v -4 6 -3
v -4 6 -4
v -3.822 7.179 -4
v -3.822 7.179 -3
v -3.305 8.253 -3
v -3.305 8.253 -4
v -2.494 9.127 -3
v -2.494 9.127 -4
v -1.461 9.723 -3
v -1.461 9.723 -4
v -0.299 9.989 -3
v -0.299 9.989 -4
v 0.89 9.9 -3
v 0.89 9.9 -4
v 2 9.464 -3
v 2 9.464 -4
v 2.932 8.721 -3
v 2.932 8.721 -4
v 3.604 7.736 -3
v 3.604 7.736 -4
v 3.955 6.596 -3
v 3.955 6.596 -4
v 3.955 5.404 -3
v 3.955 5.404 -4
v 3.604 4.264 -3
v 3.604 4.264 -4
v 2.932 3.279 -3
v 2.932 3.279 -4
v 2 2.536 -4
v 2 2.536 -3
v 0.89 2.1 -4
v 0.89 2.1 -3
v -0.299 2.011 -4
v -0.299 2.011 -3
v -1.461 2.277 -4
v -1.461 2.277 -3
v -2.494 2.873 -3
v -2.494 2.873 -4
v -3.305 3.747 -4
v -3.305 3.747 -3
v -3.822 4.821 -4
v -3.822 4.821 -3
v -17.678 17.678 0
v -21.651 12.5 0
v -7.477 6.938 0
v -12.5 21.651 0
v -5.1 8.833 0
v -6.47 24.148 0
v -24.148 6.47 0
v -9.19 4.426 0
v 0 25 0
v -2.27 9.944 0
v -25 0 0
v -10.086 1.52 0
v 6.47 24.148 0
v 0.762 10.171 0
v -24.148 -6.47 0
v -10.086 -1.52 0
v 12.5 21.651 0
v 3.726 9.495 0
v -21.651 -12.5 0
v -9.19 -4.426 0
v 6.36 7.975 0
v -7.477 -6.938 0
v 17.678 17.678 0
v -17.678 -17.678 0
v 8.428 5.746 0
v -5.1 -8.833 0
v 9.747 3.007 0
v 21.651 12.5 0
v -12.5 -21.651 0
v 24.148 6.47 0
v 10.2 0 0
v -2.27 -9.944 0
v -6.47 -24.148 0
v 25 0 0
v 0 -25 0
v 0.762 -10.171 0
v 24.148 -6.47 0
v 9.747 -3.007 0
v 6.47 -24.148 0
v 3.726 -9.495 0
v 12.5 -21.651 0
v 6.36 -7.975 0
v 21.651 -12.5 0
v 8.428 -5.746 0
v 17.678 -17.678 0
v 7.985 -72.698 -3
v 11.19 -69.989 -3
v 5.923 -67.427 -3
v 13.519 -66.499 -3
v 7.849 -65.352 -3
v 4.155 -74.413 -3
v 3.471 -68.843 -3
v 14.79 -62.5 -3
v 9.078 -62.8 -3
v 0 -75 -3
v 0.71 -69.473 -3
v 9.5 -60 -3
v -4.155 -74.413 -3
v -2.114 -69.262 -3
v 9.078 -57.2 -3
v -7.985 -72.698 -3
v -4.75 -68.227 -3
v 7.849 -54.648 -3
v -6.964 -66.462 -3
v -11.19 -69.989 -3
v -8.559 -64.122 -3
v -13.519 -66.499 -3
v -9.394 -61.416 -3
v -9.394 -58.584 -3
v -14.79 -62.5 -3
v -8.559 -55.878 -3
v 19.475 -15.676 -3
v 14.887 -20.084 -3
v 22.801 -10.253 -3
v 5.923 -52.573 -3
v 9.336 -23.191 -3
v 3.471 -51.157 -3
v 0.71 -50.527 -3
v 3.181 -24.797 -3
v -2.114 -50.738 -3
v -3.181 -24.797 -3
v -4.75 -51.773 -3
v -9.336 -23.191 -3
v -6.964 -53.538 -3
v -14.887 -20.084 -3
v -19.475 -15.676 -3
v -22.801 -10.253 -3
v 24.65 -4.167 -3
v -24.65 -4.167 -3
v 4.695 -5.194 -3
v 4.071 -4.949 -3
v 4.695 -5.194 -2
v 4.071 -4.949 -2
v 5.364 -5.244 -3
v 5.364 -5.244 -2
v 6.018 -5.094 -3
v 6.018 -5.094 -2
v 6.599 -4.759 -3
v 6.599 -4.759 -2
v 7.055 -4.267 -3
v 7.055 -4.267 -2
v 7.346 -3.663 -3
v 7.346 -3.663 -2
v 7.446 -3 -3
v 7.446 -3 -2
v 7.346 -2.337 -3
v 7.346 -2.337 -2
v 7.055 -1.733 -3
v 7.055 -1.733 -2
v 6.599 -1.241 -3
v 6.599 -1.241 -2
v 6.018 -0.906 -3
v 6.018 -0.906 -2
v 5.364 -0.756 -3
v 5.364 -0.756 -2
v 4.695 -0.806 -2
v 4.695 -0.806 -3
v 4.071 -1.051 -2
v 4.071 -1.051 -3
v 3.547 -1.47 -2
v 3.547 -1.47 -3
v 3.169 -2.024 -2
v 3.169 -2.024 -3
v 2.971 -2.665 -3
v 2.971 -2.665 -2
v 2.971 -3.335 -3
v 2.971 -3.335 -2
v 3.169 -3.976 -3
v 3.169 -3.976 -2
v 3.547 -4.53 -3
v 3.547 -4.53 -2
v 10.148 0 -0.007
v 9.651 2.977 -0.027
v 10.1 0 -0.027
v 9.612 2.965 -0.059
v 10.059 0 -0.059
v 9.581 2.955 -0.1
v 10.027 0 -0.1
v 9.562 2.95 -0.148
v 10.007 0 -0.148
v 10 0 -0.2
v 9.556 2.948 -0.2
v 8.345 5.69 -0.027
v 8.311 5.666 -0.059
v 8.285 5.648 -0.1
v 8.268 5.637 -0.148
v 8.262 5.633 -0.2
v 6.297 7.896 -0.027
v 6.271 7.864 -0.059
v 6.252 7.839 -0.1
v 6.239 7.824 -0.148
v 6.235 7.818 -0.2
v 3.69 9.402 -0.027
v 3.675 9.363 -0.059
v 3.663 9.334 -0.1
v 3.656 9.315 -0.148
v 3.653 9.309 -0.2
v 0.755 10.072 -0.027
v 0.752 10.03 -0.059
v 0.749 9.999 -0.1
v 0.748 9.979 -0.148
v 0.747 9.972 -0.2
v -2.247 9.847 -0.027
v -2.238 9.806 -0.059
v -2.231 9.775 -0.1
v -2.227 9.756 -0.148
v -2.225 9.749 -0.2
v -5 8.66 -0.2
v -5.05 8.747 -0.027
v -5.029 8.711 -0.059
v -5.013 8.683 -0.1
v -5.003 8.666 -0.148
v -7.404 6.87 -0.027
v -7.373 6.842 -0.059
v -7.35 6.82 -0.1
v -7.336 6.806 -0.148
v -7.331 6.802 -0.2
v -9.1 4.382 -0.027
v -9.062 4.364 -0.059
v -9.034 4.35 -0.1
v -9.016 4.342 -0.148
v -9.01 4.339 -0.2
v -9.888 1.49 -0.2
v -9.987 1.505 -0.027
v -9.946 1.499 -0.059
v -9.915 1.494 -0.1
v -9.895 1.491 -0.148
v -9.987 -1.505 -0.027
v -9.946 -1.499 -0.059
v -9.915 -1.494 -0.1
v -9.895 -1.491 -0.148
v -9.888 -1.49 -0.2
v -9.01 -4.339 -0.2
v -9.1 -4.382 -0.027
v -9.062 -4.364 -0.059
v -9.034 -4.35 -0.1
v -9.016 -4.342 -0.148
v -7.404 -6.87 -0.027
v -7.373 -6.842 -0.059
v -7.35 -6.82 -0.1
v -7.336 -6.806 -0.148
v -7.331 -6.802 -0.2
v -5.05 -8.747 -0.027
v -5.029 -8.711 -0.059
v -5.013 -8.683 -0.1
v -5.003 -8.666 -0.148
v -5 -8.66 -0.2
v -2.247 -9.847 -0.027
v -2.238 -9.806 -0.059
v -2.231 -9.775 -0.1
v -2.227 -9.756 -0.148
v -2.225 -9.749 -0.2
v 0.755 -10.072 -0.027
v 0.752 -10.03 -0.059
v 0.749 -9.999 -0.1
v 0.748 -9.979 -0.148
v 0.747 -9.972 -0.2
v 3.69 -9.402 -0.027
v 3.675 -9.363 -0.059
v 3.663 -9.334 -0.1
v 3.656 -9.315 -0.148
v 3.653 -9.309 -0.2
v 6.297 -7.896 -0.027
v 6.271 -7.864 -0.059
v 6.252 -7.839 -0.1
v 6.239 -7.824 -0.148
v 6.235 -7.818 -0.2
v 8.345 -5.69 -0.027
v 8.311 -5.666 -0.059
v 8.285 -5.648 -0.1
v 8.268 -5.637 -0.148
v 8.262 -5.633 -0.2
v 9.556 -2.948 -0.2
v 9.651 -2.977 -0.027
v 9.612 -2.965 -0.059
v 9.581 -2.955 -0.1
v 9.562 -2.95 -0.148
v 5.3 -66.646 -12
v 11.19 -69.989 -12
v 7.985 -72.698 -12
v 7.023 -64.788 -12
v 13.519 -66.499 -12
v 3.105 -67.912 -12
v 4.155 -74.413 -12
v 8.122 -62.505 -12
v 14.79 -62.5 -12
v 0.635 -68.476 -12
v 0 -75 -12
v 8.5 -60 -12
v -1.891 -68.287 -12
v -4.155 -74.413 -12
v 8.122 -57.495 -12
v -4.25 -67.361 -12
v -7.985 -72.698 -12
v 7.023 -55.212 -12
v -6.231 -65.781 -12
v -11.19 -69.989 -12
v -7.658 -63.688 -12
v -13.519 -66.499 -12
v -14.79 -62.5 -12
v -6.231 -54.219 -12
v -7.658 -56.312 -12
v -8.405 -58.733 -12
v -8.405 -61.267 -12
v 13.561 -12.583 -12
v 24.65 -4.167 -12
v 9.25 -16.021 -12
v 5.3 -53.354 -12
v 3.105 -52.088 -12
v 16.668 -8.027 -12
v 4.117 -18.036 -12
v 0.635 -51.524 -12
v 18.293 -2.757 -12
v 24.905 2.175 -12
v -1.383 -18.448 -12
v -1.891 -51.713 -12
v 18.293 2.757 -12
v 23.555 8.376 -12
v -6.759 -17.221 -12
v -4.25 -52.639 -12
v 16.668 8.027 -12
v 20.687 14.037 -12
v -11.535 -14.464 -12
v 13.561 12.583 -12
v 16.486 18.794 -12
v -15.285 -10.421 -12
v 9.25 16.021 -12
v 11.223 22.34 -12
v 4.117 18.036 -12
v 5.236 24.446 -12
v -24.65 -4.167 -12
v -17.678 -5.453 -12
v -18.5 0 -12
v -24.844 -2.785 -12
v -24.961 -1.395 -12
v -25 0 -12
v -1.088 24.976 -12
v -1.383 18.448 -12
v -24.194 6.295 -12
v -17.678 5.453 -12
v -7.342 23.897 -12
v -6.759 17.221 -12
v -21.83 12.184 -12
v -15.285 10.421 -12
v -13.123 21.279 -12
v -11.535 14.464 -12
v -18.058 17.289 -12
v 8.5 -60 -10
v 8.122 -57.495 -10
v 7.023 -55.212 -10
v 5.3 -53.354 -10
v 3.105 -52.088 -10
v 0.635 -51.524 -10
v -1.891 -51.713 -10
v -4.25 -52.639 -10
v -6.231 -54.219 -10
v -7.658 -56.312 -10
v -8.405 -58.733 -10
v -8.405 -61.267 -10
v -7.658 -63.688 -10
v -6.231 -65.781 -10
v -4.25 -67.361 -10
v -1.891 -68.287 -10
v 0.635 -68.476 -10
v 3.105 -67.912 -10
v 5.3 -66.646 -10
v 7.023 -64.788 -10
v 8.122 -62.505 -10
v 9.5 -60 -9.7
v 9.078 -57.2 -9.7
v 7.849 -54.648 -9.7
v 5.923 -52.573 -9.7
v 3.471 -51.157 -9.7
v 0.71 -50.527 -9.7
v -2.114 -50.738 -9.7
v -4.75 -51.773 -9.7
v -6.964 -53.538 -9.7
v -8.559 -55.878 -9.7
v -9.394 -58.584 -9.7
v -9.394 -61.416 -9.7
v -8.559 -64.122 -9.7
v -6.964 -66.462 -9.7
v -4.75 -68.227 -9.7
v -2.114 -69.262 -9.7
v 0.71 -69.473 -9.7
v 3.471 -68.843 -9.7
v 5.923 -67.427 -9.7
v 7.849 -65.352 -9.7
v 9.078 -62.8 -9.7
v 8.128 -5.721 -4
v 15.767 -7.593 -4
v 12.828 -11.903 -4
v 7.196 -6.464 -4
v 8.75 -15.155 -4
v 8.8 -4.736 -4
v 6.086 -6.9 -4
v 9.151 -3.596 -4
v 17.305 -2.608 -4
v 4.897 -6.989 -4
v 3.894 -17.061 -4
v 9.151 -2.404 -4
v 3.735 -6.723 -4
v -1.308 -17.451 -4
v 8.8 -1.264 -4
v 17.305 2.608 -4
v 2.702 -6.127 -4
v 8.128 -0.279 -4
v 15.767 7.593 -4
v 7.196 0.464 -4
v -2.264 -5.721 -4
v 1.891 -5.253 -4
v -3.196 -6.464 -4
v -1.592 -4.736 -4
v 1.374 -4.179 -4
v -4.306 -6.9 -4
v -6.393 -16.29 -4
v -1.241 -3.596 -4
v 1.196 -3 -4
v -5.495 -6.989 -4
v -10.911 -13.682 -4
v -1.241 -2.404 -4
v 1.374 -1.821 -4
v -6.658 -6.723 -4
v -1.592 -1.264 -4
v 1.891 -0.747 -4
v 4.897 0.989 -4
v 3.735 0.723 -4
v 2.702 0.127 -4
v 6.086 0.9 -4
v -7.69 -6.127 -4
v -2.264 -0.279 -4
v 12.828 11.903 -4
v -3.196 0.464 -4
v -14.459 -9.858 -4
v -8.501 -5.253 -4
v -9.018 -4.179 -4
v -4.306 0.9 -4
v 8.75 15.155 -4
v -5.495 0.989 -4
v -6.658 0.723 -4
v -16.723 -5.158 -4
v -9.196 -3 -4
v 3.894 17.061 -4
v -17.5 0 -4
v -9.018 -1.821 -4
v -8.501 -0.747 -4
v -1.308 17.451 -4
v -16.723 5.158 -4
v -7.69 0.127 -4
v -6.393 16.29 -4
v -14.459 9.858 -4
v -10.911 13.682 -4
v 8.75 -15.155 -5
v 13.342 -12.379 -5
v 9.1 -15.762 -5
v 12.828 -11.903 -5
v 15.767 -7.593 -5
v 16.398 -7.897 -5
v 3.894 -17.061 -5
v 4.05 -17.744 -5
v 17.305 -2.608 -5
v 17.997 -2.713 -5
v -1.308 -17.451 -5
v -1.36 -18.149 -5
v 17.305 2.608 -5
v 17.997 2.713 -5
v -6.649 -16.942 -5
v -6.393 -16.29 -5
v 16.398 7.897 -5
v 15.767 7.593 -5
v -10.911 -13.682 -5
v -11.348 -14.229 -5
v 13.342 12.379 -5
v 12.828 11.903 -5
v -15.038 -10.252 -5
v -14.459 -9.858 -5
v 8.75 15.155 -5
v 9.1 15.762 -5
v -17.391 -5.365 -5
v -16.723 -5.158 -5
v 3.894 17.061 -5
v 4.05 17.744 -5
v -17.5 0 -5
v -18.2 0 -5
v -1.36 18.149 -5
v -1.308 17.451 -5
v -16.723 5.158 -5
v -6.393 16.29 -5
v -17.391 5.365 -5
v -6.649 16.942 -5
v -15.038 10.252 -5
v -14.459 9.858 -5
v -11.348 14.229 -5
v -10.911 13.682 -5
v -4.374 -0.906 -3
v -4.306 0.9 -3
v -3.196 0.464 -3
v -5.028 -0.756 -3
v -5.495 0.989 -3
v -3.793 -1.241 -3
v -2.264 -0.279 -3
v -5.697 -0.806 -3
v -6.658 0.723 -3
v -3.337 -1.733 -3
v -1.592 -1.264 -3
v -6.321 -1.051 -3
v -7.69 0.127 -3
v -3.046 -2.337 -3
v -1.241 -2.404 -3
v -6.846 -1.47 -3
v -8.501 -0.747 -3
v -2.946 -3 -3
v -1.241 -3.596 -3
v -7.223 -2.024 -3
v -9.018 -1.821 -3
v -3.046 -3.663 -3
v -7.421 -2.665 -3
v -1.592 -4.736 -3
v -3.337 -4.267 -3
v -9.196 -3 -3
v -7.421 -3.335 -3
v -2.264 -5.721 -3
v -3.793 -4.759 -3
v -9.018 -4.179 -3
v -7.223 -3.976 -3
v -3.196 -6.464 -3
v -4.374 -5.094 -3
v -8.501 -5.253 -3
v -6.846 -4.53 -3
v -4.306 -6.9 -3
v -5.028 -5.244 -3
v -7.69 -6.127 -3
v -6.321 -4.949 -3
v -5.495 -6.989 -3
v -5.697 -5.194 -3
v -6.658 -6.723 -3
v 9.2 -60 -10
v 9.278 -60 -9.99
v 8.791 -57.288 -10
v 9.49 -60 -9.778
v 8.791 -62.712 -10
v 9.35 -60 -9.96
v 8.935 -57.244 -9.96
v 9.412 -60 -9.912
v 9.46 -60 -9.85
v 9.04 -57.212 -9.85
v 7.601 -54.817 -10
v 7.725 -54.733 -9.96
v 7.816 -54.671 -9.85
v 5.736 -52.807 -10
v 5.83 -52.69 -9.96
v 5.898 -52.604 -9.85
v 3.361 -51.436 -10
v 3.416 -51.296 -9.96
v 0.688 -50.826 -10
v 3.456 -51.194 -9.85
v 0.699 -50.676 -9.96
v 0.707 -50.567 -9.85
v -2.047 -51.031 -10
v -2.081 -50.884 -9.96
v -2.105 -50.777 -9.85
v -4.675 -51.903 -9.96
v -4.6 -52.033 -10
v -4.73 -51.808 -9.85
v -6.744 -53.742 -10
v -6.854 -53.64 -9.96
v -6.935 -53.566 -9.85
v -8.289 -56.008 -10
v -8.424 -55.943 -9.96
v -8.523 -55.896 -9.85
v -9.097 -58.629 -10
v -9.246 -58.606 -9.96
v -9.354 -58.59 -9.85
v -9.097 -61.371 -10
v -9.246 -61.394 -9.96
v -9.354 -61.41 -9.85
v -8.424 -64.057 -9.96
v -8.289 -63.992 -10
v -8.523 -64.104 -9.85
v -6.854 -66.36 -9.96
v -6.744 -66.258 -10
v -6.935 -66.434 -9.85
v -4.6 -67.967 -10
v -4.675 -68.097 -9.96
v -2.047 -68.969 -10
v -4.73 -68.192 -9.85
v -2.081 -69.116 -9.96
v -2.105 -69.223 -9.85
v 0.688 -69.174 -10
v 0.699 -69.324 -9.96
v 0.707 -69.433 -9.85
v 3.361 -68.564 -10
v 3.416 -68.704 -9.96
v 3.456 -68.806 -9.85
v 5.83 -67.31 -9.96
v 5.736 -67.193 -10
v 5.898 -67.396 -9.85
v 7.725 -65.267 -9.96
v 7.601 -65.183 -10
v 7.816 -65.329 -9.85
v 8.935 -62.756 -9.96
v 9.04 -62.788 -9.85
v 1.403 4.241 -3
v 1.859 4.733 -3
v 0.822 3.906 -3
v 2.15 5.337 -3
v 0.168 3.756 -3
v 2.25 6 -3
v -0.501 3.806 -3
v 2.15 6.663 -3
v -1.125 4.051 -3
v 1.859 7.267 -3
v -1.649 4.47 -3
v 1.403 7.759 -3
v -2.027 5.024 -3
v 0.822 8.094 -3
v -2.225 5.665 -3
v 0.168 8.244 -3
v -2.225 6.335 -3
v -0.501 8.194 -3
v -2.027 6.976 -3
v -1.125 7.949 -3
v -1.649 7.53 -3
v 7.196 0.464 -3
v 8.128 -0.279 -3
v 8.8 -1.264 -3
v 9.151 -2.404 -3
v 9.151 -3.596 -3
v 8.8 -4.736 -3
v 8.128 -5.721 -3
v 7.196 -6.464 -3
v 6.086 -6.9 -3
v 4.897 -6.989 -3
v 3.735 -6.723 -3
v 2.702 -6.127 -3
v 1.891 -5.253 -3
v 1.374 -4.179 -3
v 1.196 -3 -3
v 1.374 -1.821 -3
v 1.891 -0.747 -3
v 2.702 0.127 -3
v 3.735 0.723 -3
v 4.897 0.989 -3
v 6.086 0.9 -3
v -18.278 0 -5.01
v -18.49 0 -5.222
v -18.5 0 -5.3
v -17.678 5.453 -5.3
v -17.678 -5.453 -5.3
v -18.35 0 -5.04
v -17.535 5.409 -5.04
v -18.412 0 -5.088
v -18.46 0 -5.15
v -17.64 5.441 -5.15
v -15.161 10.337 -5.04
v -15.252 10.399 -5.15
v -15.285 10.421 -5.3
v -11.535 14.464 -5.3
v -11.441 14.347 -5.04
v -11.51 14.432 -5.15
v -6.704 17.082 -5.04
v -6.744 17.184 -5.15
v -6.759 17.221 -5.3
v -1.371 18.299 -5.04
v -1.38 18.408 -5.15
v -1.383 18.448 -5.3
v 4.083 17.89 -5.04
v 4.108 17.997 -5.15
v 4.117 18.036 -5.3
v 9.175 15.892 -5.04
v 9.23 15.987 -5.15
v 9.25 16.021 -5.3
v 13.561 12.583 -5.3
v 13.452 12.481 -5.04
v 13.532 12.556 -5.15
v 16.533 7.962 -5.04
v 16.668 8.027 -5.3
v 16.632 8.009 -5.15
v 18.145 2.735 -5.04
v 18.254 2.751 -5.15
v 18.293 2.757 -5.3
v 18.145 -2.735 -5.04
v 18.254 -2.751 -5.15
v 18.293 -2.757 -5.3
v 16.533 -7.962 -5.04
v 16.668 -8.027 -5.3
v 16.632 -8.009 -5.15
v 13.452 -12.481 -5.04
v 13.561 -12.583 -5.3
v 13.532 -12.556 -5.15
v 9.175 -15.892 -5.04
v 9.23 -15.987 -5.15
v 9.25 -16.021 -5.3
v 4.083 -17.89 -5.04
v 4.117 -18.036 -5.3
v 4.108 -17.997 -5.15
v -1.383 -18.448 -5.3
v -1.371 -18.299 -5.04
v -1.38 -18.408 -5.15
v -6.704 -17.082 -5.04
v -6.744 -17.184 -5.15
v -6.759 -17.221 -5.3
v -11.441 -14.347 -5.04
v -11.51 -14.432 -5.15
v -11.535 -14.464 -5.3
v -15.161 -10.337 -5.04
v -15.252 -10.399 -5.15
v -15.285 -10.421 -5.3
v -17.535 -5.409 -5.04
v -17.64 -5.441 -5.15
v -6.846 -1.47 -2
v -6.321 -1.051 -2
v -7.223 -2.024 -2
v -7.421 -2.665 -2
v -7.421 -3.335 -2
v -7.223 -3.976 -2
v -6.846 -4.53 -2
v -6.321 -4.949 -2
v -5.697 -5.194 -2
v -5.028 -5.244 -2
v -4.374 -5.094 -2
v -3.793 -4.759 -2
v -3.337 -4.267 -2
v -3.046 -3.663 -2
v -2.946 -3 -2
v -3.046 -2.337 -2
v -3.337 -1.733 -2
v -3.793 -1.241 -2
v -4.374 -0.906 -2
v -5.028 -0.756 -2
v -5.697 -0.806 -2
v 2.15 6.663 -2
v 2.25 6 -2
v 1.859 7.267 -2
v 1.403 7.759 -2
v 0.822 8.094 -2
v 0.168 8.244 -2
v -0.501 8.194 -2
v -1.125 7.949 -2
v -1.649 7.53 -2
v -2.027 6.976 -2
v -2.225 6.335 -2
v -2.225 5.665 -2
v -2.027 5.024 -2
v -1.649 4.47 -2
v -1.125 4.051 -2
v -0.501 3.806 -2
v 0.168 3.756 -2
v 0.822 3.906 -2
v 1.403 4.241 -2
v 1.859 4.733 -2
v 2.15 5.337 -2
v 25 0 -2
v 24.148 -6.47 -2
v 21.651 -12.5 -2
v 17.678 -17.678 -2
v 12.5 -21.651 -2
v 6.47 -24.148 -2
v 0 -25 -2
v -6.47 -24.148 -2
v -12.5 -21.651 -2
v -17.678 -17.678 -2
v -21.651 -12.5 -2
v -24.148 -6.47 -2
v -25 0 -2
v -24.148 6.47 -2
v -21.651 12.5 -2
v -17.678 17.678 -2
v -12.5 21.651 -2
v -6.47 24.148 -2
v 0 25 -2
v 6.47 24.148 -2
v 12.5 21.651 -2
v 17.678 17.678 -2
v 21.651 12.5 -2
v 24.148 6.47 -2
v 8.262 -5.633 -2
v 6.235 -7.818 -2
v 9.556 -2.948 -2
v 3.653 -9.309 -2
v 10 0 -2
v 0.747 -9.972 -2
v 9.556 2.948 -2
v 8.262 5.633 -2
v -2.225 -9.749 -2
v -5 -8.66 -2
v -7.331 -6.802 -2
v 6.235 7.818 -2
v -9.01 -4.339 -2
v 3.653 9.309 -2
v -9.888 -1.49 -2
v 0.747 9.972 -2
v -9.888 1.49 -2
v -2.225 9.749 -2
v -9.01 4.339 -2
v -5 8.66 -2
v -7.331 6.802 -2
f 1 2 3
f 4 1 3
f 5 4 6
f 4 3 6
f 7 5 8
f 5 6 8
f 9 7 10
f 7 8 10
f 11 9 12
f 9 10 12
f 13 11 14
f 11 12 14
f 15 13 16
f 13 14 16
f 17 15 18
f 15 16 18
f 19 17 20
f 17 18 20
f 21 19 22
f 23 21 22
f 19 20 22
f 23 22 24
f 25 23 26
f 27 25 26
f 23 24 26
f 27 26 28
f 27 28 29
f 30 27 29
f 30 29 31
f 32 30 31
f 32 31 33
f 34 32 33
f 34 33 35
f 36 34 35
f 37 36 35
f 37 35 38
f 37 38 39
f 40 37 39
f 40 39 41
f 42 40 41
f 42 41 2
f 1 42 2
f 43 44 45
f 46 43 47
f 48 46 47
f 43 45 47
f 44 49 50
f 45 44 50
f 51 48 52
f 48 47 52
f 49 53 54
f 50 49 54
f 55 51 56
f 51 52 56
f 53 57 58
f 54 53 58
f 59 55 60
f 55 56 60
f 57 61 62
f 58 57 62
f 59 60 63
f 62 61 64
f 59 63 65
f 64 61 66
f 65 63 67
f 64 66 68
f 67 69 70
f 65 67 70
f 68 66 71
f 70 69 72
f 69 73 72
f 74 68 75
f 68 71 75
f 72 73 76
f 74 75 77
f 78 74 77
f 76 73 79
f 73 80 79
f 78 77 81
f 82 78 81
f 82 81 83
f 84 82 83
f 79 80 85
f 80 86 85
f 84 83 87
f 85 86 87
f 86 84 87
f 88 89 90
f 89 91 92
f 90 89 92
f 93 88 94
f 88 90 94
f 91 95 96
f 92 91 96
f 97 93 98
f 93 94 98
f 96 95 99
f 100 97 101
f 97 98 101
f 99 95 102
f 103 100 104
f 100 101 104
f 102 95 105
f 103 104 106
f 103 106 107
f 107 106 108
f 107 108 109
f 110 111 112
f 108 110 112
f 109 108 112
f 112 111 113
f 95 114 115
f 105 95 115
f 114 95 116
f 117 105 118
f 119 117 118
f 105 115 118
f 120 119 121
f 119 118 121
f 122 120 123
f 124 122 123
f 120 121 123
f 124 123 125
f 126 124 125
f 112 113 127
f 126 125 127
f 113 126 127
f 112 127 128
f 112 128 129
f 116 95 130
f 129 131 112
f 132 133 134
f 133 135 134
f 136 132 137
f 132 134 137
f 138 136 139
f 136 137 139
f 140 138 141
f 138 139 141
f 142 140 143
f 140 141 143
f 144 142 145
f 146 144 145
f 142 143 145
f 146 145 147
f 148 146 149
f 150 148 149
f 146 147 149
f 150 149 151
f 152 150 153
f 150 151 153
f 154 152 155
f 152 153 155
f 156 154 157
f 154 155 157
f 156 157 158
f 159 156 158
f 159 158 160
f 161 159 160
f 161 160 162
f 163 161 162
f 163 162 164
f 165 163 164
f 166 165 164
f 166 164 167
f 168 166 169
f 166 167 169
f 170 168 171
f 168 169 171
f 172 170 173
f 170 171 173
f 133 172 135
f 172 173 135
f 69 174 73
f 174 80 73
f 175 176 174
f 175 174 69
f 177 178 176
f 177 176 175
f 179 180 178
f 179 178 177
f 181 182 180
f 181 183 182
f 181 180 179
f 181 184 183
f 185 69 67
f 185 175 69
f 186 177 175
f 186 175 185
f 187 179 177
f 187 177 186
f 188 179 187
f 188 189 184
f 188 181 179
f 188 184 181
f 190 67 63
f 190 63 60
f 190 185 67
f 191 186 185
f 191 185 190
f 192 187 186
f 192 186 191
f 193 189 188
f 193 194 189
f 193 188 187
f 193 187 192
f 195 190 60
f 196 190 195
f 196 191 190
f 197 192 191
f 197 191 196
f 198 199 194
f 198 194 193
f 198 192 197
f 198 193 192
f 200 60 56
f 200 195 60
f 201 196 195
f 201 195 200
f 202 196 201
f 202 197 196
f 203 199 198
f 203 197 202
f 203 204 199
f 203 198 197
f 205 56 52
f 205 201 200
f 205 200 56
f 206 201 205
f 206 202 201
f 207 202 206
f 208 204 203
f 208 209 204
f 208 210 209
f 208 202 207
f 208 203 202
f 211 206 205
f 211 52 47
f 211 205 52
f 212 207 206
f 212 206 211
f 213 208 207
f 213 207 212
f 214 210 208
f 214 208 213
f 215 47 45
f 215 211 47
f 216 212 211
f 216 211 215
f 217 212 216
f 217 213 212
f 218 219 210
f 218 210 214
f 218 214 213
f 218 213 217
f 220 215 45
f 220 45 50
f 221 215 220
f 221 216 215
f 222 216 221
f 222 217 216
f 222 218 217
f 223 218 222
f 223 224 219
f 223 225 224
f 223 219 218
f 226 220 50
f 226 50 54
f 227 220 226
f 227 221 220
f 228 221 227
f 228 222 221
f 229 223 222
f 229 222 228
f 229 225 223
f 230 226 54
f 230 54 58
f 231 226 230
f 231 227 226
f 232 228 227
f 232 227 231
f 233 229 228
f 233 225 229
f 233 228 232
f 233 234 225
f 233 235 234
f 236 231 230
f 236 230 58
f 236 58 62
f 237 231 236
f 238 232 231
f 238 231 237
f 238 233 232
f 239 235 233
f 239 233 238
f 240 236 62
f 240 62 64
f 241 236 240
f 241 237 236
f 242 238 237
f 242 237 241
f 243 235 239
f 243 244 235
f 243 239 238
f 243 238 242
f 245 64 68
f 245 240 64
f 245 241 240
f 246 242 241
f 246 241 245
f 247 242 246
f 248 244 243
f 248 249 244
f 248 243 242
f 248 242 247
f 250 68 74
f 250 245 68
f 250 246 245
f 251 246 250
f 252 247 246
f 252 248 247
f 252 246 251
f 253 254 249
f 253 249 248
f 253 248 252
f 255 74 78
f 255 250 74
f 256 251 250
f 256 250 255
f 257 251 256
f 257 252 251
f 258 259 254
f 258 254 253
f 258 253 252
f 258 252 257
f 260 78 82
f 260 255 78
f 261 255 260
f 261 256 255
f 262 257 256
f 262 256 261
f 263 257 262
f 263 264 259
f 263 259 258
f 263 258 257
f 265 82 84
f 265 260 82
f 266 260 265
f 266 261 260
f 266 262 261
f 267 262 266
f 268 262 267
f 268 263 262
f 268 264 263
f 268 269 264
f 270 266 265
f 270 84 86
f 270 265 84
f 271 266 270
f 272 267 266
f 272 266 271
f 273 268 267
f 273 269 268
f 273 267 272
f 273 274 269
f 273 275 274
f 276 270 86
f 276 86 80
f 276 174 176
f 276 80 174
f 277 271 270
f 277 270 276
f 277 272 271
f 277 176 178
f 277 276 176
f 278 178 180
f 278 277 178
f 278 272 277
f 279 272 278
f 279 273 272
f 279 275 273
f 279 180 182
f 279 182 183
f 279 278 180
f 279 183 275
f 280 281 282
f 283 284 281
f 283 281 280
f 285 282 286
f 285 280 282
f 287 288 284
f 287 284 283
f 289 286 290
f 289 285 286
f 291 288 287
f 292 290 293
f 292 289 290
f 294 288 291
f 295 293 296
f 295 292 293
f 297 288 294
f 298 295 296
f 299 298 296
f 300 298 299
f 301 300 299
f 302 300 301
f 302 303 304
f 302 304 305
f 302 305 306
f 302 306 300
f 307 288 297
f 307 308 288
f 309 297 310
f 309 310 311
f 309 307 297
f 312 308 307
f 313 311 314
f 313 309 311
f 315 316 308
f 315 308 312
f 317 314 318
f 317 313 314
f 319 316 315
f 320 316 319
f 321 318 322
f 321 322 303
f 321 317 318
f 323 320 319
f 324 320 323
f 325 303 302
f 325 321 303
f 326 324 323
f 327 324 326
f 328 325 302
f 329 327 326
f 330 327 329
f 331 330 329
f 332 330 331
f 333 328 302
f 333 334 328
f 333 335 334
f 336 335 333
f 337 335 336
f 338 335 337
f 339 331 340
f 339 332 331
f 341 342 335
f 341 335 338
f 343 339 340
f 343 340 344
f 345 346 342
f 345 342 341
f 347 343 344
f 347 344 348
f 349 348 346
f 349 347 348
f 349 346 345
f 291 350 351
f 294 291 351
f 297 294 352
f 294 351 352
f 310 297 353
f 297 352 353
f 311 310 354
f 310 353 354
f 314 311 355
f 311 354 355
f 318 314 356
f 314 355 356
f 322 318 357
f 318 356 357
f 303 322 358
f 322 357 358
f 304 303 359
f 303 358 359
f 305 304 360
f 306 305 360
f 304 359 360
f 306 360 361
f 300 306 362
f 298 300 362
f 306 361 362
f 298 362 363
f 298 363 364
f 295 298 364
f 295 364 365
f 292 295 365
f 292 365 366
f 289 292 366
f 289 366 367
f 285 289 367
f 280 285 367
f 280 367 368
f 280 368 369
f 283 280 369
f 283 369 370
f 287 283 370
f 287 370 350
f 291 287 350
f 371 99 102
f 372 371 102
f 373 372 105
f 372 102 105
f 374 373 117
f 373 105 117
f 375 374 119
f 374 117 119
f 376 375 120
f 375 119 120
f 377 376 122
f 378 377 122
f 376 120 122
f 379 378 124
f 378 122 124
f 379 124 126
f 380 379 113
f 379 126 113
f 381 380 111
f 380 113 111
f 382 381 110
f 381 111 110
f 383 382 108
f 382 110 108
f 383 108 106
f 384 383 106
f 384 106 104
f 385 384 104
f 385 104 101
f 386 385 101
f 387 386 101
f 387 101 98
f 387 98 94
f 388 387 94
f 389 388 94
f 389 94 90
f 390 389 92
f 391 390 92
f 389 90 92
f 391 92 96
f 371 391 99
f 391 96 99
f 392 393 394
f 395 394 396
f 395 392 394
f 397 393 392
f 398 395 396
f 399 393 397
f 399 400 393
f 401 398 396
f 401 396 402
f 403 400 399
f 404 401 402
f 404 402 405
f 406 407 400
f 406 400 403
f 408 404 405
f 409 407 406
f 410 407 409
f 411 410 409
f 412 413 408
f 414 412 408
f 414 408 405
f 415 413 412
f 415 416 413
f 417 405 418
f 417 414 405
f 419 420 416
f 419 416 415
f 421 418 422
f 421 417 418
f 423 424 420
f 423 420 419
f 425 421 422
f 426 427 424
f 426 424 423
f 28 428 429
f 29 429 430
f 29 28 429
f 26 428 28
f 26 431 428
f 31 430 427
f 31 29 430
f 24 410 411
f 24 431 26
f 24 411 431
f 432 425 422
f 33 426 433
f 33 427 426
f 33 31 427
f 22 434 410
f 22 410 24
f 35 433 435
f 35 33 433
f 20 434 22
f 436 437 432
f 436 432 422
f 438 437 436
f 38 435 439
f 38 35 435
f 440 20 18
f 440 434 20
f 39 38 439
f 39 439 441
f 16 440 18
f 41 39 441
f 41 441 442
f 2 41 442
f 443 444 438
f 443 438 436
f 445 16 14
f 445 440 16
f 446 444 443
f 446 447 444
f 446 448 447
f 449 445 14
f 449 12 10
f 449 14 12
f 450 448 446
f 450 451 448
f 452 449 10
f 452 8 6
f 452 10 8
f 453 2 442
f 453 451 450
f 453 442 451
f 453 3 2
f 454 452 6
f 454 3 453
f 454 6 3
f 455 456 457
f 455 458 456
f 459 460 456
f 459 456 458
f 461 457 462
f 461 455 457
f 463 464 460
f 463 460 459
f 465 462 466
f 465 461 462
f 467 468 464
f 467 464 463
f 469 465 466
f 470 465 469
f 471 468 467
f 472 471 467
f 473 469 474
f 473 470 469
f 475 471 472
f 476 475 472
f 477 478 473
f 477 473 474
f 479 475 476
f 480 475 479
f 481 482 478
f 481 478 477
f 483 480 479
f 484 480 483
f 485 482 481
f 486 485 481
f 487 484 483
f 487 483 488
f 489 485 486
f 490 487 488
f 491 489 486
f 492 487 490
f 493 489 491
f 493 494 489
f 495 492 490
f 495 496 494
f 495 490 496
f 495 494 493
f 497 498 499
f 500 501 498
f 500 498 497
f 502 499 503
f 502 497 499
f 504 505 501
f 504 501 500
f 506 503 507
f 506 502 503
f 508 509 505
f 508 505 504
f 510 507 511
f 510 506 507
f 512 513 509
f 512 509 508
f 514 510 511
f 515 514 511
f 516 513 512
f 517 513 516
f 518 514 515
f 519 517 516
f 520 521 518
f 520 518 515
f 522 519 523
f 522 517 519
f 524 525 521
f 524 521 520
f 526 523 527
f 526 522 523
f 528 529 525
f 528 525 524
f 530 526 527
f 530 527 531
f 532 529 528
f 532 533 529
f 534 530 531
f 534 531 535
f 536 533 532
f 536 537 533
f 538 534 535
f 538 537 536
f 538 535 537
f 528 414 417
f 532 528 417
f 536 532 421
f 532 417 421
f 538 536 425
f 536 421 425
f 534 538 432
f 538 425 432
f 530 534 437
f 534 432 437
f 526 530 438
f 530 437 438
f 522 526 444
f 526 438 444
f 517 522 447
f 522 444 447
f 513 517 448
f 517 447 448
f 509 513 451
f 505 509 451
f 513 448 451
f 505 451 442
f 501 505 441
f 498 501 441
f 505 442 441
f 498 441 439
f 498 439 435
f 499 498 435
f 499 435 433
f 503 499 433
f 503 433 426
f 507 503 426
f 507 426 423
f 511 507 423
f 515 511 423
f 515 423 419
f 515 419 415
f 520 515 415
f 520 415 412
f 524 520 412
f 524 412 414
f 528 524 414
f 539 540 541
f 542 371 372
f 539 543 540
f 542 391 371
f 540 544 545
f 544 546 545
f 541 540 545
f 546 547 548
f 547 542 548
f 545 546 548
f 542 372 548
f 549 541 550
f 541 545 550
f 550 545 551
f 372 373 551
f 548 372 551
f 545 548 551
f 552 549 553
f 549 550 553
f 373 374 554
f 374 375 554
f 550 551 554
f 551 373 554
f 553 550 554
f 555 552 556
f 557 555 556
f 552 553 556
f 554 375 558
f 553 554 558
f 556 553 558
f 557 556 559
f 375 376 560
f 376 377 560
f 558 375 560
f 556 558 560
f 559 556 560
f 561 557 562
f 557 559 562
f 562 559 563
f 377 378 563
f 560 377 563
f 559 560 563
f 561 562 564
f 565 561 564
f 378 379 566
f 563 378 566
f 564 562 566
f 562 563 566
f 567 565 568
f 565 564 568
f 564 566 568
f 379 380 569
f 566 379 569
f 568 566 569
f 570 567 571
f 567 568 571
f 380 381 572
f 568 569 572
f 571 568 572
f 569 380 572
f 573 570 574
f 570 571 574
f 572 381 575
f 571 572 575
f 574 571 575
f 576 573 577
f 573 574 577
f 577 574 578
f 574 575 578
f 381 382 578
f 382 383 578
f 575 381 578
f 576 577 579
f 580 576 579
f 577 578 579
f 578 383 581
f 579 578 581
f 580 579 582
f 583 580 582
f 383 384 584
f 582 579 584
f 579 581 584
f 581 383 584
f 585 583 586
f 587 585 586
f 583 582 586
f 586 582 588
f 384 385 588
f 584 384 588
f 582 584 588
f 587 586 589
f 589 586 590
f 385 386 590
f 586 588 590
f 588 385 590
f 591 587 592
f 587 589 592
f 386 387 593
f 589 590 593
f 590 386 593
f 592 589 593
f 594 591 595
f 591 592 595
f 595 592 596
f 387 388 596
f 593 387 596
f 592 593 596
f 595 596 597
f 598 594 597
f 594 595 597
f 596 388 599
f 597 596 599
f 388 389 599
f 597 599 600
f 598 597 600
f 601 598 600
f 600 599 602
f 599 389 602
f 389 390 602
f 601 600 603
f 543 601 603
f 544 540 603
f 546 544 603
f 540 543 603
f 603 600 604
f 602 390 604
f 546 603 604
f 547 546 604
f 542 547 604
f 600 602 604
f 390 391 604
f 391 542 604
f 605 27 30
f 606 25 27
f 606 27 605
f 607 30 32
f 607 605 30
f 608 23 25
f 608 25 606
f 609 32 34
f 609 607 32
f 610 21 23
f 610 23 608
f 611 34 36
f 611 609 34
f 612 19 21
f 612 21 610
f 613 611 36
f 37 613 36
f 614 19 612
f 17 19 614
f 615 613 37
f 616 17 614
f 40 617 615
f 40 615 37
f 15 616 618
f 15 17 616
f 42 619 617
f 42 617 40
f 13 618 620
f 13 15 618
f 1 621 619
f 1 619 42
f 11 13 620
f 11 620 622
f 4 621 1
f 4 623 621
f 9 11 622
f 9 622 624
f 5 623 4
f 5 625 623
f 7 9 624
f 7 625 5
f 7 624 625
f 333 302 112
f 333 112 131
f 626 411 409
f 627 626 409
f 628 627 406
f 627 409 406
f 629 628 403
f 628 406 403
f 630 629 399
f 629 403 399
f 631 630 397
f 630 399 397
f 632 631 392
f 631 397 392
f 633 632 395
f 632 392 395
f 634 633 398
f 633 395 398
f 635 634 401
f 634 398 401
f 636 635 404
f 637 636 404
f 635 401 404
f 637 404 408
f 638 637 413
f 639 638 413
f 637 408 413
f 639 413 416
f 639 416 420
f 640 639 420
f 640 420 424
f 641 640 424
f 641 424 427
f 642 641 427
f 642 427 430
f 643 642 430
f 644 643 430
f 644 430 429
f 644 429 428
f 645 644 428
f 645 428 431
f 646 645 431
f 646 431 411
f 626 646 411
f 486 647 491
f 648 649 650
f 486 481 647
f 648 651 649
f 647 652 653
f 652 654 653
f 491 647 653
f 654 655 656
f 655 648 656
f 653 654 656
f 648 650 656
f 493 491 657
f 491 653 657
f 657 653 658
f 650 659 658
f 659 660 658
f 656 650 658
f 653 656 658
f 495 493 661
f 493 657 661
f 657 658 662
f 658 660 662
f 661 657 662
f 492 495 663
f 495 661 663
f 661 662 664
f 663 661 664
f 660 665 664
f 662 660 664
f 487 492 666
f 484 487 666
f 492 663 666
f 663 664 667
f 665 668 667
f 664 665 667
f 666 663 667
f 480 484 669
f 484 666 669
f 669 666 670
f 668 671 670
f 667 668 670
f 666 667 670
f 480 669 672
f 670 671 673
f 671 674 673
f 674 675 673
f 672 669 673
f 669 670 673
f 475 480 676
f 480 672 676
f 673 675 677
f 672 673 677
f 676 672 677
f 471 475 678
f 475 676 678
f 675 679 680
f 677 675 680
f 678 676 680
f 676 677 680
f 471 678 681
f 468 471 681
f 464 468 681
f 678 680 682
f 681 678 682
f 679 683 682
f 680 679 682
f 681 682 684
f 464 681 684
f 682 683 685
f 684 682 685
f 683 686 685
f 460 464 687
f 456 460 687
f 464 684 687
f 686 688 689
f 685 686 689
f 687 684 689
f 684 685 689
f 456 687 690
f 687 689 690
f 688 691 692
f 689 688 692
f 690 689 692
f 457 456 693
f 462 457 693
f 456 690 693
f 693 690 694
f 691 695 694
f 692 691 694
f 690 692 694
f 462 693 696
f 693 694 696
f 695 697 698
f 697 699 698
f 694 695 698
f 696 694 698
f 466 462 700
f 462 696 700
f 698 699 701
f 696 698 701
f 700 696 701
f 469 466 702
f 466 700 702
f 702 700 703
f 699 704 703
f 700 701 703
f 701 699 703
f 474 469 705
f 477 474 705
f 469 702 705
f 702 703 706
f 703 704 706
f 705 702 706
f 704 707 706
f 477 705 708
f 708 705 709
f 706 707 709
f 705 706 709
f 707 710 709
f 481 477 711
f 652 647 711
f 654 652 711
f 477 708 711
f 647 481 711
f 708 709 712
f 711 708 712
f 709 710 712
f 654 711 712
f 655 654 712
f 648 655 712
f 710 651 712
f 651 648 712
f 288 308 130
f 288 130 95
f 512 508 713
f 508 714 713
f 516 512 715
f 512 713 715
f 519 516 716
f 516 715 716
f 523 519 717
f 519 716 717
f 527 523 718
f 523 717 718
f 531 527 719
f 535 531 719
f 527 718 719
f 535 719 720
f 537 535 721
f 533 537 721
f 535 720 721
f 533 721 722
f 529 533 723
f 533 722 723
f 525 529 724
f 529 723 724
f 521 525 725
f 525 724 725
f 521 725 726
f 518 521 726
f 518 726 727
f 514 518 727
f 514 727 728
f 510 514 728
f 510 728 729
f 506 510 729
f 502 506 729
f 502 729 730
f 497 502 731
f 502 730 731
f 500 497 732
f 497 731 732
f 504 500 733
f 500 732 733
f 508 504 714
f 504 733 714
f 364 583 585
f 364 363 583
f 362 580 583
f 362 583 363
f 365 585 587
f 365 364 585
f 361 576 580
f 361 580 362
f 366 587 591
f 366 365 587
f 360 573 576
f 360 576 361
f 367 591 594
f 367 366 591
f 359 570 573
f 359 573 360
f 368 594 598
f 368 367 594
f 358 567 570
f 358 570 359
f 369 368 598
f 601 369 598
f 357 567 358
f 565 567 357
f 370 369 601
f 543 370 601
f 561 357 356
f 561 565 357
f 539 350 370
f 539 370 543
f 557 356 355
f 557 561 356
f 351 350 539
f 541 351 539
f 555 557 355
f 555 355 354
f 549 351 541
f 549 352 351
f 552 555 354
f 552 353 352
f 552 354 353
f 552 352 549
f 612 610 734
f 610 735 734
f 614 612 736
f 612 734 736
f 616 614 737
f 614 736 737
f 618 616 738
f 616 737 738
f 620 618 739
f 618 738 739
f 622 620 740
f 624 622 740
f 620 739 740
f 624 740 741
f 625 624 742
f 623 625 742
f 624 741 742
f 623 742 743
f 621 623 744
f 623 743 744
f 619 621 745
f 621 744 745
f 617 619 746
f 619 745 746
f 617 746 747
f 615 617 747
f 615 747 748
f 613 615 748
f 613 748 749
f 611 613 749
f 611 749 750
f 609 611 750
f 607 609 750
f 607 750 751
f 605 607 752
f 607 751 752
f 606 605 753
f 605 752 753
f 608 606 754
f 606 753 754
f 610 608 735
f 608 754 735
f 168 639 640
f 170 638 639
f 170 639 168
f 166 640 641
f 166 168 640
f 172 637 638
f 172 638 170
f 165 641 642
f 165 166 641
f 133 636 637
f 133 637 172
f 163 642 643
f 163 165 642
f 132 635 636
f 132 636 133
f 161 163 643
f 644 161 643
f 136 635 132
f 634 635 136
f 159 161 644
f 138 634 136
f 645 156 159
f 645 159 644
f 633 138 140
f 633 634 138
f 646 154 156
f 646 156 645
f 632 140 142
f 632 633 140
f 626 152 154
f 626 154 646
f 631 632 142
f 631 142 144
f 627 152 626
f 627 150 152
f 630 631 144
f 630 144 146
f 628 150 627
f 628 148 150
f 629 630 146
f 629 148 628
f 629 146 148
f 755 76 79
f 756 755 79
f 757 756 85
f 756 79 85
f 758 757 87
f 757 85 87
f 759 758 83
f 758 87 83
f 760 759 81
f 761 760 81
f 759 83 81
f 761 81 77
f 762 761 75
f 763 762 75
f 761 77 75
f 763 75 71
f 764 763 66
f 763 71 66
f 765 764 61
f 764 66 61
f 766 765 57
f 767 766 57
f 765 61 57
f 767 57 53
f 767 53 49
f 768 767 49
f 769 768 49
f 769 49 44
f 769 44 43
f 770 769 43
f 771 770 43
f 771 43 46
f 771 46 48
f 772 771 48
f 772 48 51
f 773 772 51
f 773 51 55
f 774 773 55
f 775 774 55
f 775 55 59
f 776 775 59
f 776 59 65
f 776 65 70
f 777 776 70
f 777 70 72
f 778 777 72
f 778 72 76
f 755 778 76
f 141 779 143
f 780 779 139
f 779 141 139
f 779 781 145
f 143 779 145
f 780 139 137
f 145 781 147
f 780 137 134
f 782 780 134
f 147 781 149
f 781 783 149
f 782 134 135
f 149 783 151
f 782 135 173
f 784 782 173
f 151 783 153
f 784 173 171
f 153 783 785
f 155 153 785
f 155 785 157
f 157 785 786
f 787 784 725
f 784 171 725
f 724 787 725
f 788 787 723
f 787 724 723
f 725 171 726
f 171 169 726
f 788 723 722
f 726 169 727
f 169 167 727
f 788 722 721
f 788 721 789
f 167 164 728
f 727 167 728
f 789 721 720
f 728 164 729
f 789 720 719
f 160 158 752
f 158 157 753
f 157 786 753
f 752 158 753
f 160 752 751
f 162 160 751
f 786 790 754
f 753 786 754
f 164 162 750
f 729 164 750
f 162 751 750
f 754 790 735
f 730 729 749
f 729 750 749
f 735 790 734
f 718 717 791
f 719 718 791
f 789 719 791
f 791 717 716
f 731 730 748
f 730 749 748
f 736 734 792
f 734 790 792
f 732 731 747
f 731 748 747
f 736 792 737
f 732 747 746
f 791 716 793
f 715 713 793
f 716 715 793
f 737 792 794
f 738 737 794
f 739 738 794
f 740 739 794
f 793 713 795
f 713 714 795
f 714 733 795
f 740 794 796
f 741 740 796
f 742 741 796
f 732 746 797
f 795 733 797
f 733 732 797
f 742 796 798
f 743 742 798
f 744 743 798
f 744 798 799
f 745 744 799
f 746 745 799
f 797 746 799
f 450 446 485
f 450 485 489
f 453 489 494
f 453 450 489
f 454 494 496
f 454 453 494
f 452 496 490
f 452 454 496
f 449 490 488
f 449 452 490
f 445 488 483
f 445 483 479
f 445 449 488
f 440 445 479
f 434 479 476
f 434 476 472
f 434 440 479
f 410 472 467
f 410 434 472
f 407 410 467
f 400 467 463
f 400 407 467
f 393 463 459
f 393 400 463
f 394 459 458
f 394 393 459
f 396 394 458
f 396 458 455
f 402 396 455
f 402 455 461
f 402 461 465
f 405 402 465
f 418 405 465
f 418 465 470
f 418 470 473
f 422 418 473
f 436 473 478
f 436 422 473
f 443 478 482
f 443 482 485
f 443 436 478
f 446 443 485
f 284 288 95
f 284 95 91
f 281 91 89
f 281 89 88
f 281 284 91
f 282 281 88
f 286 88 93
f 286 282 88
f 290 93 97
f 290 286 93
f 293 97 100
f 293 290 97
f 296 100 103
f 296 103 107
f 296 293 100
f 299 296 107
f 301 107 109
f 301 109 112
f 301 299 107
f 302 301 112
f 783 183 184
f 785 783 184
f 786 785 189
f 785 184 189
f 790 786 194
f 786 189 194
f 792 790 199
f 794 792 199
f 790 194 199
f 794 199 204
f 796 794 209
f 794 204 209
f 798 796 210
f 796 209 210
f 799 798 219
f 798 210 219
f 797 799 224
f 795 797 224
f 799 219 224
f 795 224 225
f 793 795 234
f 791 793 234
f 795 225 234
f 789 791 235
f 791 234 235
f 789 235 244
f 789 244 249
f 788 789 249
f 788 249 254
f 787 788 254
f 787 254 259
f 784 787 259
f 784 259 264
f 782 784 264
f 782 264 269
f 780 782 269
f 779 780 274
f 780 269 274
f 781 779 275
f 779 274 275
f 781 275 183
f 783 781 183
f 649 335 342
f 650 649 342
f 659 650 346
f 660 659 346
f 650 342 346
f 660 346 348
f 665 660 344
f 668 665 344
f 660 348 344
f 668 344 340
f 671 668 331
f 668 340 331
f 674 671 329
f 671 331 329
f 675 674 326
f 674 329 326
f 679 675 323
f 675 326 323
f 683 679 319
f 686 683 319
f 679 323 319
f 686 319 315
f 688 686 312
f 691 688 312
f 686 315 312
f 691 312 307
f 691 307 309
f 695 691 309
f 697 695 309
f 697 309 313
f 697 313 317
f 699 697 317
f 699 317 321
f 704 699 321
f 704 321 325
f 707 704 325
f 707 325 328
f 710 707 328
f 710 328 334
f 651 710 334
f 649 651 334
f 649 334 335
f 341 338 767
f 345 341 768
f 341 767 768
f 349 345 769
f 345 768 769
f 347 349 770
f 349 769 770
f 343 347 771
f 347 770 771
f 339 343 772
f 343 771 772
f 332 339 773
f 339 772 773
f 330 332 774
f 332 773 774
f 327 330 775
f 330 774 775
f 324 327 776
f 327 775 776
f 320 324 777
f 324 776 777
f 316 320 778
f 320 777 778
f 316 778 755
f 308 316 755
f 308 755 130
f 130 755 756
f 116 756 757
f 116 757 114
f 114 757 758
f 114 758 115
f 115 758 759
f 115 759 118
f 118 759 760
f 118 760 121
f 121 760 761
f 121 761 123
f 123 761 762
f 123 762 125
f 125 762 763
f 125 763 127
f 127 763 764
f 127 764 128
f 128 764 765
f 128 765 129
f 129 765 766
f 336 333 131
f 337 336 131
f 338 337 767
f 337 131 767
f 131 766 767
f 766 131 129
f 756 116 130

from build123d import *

# Parameters (mm, degrees)
SKETCH_2_R                   = 25
EXTRUDE_2_DEPTH              = 2
SKETCH_22_R                  = 10
CUT_EXTRUDE_1_DEPTH          = 2
FILLET_4_R                   = 0.2
SKETCH_54_R                  = 25
EXTRUDE_6_DEPTH              = 10
SKETCH_55_R                  = 18.5
CUT_EXTRUDE_2_DEPTH          = 8
HOLE_WIZARD_M4_1_D           = 4.5
HOLE_WIZARD_M4_1_CBORE_D     = 8
HOLE_WIZARD_M4_1_CBORE_DEPTH = 1
PATTERN_CIRCULAR_1_COUNT     = 3
SKETCH_59_R                  = 18.5
SKETCH_59_R_2                = 17.5
EXTRUDE_7_DEPTH              = 1
EXTRUDE_8_DEPTH              = 9
FILLET_6_R                   = 0.3
SKETCH_68_R                  = 9.5
CUT_EXTRUDE_7_DEPTH          = 7
SKETCH_69_R                  = 8.5
CUT_EXTRUDE_8_DEPTH          = 3
FILLET_7_R                   = 0.3


with BuildPart() as part:
    # 스케치2 → 보스-돌출2 (new body)
    with BuildSketch(Plane(origin=(0, 6, 0), x_dir=(1, 0, 0), z_dir=(0, 0, -1))):
        with Locations((0, 6)):
            Circle(SKETCH_2_R)
    extrude(amount=EXTRUDE_2_DEPTH)

    # 스케치22 → 컷-돌출1 (cut)
    with BuildSketch(Plane.XY):
        Circle(SKETCH_22_R)
    extrude(amount=-CUT_EXTRUDE_1_DEPTH, mode=Mode.SUBTRACT)

    # 필렛4
    fillet_4_edges = [part.edges().sort_by_distance(p)[0] for p in [
        (-10, 0, 0),
    ]]
    fillet(fillet_4_edges, radius=FILLET_4_R)

    # 스케치54 → 보스-돌출6 (add)
    with BuildSketch(Plane(origin=(0, 0, -2), x_dir=(-1, 0, 0), z_dir=(0, 0, -1))):
        Circle(SKETCH_54_R)
    extrude(amount=EXTRUDE_6_DEPTH)

    # 스케치55 → 컷-돌출2 (cut)
    with BuildSketch(Plane(origin=(0, 0, -12), x_dir=(-1, 0, 0), z_dir=(0, 0, -1))):
        Circle(SKETCH_55_R)
    extrude(amount=-CUT_EXTRUDE_2_DEPTH, mode=Mode.SUBTRACT)

    # M4 육각 소켓 머리 캡 나사용 카운터보어1 (through all)
    with Locations(Plane(origin=(0, 0, -4), x_dir=(-1, 0, 0), z_dir=(0, 0, -1))):
        with Locations((0, 6)):
            hole_wizard_m4_1 = CounterBoreHole(HOLE_WIZARD_M4_1_D / 2, HOLE_WIZARD_M4_1_CBORE_D / 2, HOLE_WIZARD_M4_1_CBORE_DEPTH)

    # 원형 패턴1: M4 육각 소켓 머리 캡 나사용 카운터보어1 ×3 about axis
    pattern_circular_1_axis = Axis((0, 0, 0), (0, 0, 1))
    for i in range(1, PATTERN_CIRCULAR_1_COUNT):
        add(hole_wizard_m4_1.rotate(pattern_circular_1_axis, i * 360 / PATTERN_CIRCULAR_1_COUNT), mode=Mode.SUBTRACT)

    # 스케치59 → 보스-돌출7 (add)
    with BuildSketch(Plane(origin=(0, 0, -4), x_dir=(-1, 0, 0), z_dir=(0, 0, -1))):
        Circle(SKETCH_59_R)
        Circle(SKETCH_59_R_2, mode=Mode.SUBTRACT)
    extrude(amount=EXTRUDE_7_DEPTH)

    # 스케치60 → 보스-돌출8 (add)
    with BuildSketch(Plane(origin=(0, 0, -12), x_dir=(-1, 0, 0), z_dir=(0, 0, -1))):
        with BuildLine():
            Line((-24.65033243, -4.166666667), (-14.790199458, -62.5))
            ThreePointArc((-14.790199458, -62.5), (0, -75), (14.790199458, -62.5))
            Line((14.790199458, -62.5), (24.65033243, -4.166666667))
            ThreePointArc((24.65033243, -4.166666667), (0, -25), (-24.65033243, -4.166666667))
        make_face()
    extrude(amount=-EXTRUDE_8_DEPTH)

    # 필렛6
    fillet_6_edges = [part.edges().sort_by_distance(p)[0] for p in [
        (18.5, 0, -5),
    ]]
    fillet(fillet_6_edges, radius=FILLET_6_R)

    # 스케치68 → 컷-돌출7 (cut)
    with BuildSketch(Plane.XY.offset(-3)):
        with Locations((0, -60)):
            Circle(SKETCH_68_R)
    extrude(amount=-CUT_EXTRUDE_7_DEPTH, mode=Mode.SUBTRACT)

    # 스케치69 → 컷-돌출8 (cut, through all)
    with BuildSketch(Plane.XY.offset(-10)):
        with Locations((0, -60)):
            Circle(SKETCH_69_R)
    extrude(amount=-CUT_EXTRUDE_8_DEPTH, mode=Mode.SUBTRACT)

    # 필렛7
    fillet_7_edges = [part.edges().sort_by_distance(p)[0] for p in [
        (-9.5, -60, -10),
    ]]
    fillet(fillet_7_edges, radius=FILLET_7_R)


solid = part.part
